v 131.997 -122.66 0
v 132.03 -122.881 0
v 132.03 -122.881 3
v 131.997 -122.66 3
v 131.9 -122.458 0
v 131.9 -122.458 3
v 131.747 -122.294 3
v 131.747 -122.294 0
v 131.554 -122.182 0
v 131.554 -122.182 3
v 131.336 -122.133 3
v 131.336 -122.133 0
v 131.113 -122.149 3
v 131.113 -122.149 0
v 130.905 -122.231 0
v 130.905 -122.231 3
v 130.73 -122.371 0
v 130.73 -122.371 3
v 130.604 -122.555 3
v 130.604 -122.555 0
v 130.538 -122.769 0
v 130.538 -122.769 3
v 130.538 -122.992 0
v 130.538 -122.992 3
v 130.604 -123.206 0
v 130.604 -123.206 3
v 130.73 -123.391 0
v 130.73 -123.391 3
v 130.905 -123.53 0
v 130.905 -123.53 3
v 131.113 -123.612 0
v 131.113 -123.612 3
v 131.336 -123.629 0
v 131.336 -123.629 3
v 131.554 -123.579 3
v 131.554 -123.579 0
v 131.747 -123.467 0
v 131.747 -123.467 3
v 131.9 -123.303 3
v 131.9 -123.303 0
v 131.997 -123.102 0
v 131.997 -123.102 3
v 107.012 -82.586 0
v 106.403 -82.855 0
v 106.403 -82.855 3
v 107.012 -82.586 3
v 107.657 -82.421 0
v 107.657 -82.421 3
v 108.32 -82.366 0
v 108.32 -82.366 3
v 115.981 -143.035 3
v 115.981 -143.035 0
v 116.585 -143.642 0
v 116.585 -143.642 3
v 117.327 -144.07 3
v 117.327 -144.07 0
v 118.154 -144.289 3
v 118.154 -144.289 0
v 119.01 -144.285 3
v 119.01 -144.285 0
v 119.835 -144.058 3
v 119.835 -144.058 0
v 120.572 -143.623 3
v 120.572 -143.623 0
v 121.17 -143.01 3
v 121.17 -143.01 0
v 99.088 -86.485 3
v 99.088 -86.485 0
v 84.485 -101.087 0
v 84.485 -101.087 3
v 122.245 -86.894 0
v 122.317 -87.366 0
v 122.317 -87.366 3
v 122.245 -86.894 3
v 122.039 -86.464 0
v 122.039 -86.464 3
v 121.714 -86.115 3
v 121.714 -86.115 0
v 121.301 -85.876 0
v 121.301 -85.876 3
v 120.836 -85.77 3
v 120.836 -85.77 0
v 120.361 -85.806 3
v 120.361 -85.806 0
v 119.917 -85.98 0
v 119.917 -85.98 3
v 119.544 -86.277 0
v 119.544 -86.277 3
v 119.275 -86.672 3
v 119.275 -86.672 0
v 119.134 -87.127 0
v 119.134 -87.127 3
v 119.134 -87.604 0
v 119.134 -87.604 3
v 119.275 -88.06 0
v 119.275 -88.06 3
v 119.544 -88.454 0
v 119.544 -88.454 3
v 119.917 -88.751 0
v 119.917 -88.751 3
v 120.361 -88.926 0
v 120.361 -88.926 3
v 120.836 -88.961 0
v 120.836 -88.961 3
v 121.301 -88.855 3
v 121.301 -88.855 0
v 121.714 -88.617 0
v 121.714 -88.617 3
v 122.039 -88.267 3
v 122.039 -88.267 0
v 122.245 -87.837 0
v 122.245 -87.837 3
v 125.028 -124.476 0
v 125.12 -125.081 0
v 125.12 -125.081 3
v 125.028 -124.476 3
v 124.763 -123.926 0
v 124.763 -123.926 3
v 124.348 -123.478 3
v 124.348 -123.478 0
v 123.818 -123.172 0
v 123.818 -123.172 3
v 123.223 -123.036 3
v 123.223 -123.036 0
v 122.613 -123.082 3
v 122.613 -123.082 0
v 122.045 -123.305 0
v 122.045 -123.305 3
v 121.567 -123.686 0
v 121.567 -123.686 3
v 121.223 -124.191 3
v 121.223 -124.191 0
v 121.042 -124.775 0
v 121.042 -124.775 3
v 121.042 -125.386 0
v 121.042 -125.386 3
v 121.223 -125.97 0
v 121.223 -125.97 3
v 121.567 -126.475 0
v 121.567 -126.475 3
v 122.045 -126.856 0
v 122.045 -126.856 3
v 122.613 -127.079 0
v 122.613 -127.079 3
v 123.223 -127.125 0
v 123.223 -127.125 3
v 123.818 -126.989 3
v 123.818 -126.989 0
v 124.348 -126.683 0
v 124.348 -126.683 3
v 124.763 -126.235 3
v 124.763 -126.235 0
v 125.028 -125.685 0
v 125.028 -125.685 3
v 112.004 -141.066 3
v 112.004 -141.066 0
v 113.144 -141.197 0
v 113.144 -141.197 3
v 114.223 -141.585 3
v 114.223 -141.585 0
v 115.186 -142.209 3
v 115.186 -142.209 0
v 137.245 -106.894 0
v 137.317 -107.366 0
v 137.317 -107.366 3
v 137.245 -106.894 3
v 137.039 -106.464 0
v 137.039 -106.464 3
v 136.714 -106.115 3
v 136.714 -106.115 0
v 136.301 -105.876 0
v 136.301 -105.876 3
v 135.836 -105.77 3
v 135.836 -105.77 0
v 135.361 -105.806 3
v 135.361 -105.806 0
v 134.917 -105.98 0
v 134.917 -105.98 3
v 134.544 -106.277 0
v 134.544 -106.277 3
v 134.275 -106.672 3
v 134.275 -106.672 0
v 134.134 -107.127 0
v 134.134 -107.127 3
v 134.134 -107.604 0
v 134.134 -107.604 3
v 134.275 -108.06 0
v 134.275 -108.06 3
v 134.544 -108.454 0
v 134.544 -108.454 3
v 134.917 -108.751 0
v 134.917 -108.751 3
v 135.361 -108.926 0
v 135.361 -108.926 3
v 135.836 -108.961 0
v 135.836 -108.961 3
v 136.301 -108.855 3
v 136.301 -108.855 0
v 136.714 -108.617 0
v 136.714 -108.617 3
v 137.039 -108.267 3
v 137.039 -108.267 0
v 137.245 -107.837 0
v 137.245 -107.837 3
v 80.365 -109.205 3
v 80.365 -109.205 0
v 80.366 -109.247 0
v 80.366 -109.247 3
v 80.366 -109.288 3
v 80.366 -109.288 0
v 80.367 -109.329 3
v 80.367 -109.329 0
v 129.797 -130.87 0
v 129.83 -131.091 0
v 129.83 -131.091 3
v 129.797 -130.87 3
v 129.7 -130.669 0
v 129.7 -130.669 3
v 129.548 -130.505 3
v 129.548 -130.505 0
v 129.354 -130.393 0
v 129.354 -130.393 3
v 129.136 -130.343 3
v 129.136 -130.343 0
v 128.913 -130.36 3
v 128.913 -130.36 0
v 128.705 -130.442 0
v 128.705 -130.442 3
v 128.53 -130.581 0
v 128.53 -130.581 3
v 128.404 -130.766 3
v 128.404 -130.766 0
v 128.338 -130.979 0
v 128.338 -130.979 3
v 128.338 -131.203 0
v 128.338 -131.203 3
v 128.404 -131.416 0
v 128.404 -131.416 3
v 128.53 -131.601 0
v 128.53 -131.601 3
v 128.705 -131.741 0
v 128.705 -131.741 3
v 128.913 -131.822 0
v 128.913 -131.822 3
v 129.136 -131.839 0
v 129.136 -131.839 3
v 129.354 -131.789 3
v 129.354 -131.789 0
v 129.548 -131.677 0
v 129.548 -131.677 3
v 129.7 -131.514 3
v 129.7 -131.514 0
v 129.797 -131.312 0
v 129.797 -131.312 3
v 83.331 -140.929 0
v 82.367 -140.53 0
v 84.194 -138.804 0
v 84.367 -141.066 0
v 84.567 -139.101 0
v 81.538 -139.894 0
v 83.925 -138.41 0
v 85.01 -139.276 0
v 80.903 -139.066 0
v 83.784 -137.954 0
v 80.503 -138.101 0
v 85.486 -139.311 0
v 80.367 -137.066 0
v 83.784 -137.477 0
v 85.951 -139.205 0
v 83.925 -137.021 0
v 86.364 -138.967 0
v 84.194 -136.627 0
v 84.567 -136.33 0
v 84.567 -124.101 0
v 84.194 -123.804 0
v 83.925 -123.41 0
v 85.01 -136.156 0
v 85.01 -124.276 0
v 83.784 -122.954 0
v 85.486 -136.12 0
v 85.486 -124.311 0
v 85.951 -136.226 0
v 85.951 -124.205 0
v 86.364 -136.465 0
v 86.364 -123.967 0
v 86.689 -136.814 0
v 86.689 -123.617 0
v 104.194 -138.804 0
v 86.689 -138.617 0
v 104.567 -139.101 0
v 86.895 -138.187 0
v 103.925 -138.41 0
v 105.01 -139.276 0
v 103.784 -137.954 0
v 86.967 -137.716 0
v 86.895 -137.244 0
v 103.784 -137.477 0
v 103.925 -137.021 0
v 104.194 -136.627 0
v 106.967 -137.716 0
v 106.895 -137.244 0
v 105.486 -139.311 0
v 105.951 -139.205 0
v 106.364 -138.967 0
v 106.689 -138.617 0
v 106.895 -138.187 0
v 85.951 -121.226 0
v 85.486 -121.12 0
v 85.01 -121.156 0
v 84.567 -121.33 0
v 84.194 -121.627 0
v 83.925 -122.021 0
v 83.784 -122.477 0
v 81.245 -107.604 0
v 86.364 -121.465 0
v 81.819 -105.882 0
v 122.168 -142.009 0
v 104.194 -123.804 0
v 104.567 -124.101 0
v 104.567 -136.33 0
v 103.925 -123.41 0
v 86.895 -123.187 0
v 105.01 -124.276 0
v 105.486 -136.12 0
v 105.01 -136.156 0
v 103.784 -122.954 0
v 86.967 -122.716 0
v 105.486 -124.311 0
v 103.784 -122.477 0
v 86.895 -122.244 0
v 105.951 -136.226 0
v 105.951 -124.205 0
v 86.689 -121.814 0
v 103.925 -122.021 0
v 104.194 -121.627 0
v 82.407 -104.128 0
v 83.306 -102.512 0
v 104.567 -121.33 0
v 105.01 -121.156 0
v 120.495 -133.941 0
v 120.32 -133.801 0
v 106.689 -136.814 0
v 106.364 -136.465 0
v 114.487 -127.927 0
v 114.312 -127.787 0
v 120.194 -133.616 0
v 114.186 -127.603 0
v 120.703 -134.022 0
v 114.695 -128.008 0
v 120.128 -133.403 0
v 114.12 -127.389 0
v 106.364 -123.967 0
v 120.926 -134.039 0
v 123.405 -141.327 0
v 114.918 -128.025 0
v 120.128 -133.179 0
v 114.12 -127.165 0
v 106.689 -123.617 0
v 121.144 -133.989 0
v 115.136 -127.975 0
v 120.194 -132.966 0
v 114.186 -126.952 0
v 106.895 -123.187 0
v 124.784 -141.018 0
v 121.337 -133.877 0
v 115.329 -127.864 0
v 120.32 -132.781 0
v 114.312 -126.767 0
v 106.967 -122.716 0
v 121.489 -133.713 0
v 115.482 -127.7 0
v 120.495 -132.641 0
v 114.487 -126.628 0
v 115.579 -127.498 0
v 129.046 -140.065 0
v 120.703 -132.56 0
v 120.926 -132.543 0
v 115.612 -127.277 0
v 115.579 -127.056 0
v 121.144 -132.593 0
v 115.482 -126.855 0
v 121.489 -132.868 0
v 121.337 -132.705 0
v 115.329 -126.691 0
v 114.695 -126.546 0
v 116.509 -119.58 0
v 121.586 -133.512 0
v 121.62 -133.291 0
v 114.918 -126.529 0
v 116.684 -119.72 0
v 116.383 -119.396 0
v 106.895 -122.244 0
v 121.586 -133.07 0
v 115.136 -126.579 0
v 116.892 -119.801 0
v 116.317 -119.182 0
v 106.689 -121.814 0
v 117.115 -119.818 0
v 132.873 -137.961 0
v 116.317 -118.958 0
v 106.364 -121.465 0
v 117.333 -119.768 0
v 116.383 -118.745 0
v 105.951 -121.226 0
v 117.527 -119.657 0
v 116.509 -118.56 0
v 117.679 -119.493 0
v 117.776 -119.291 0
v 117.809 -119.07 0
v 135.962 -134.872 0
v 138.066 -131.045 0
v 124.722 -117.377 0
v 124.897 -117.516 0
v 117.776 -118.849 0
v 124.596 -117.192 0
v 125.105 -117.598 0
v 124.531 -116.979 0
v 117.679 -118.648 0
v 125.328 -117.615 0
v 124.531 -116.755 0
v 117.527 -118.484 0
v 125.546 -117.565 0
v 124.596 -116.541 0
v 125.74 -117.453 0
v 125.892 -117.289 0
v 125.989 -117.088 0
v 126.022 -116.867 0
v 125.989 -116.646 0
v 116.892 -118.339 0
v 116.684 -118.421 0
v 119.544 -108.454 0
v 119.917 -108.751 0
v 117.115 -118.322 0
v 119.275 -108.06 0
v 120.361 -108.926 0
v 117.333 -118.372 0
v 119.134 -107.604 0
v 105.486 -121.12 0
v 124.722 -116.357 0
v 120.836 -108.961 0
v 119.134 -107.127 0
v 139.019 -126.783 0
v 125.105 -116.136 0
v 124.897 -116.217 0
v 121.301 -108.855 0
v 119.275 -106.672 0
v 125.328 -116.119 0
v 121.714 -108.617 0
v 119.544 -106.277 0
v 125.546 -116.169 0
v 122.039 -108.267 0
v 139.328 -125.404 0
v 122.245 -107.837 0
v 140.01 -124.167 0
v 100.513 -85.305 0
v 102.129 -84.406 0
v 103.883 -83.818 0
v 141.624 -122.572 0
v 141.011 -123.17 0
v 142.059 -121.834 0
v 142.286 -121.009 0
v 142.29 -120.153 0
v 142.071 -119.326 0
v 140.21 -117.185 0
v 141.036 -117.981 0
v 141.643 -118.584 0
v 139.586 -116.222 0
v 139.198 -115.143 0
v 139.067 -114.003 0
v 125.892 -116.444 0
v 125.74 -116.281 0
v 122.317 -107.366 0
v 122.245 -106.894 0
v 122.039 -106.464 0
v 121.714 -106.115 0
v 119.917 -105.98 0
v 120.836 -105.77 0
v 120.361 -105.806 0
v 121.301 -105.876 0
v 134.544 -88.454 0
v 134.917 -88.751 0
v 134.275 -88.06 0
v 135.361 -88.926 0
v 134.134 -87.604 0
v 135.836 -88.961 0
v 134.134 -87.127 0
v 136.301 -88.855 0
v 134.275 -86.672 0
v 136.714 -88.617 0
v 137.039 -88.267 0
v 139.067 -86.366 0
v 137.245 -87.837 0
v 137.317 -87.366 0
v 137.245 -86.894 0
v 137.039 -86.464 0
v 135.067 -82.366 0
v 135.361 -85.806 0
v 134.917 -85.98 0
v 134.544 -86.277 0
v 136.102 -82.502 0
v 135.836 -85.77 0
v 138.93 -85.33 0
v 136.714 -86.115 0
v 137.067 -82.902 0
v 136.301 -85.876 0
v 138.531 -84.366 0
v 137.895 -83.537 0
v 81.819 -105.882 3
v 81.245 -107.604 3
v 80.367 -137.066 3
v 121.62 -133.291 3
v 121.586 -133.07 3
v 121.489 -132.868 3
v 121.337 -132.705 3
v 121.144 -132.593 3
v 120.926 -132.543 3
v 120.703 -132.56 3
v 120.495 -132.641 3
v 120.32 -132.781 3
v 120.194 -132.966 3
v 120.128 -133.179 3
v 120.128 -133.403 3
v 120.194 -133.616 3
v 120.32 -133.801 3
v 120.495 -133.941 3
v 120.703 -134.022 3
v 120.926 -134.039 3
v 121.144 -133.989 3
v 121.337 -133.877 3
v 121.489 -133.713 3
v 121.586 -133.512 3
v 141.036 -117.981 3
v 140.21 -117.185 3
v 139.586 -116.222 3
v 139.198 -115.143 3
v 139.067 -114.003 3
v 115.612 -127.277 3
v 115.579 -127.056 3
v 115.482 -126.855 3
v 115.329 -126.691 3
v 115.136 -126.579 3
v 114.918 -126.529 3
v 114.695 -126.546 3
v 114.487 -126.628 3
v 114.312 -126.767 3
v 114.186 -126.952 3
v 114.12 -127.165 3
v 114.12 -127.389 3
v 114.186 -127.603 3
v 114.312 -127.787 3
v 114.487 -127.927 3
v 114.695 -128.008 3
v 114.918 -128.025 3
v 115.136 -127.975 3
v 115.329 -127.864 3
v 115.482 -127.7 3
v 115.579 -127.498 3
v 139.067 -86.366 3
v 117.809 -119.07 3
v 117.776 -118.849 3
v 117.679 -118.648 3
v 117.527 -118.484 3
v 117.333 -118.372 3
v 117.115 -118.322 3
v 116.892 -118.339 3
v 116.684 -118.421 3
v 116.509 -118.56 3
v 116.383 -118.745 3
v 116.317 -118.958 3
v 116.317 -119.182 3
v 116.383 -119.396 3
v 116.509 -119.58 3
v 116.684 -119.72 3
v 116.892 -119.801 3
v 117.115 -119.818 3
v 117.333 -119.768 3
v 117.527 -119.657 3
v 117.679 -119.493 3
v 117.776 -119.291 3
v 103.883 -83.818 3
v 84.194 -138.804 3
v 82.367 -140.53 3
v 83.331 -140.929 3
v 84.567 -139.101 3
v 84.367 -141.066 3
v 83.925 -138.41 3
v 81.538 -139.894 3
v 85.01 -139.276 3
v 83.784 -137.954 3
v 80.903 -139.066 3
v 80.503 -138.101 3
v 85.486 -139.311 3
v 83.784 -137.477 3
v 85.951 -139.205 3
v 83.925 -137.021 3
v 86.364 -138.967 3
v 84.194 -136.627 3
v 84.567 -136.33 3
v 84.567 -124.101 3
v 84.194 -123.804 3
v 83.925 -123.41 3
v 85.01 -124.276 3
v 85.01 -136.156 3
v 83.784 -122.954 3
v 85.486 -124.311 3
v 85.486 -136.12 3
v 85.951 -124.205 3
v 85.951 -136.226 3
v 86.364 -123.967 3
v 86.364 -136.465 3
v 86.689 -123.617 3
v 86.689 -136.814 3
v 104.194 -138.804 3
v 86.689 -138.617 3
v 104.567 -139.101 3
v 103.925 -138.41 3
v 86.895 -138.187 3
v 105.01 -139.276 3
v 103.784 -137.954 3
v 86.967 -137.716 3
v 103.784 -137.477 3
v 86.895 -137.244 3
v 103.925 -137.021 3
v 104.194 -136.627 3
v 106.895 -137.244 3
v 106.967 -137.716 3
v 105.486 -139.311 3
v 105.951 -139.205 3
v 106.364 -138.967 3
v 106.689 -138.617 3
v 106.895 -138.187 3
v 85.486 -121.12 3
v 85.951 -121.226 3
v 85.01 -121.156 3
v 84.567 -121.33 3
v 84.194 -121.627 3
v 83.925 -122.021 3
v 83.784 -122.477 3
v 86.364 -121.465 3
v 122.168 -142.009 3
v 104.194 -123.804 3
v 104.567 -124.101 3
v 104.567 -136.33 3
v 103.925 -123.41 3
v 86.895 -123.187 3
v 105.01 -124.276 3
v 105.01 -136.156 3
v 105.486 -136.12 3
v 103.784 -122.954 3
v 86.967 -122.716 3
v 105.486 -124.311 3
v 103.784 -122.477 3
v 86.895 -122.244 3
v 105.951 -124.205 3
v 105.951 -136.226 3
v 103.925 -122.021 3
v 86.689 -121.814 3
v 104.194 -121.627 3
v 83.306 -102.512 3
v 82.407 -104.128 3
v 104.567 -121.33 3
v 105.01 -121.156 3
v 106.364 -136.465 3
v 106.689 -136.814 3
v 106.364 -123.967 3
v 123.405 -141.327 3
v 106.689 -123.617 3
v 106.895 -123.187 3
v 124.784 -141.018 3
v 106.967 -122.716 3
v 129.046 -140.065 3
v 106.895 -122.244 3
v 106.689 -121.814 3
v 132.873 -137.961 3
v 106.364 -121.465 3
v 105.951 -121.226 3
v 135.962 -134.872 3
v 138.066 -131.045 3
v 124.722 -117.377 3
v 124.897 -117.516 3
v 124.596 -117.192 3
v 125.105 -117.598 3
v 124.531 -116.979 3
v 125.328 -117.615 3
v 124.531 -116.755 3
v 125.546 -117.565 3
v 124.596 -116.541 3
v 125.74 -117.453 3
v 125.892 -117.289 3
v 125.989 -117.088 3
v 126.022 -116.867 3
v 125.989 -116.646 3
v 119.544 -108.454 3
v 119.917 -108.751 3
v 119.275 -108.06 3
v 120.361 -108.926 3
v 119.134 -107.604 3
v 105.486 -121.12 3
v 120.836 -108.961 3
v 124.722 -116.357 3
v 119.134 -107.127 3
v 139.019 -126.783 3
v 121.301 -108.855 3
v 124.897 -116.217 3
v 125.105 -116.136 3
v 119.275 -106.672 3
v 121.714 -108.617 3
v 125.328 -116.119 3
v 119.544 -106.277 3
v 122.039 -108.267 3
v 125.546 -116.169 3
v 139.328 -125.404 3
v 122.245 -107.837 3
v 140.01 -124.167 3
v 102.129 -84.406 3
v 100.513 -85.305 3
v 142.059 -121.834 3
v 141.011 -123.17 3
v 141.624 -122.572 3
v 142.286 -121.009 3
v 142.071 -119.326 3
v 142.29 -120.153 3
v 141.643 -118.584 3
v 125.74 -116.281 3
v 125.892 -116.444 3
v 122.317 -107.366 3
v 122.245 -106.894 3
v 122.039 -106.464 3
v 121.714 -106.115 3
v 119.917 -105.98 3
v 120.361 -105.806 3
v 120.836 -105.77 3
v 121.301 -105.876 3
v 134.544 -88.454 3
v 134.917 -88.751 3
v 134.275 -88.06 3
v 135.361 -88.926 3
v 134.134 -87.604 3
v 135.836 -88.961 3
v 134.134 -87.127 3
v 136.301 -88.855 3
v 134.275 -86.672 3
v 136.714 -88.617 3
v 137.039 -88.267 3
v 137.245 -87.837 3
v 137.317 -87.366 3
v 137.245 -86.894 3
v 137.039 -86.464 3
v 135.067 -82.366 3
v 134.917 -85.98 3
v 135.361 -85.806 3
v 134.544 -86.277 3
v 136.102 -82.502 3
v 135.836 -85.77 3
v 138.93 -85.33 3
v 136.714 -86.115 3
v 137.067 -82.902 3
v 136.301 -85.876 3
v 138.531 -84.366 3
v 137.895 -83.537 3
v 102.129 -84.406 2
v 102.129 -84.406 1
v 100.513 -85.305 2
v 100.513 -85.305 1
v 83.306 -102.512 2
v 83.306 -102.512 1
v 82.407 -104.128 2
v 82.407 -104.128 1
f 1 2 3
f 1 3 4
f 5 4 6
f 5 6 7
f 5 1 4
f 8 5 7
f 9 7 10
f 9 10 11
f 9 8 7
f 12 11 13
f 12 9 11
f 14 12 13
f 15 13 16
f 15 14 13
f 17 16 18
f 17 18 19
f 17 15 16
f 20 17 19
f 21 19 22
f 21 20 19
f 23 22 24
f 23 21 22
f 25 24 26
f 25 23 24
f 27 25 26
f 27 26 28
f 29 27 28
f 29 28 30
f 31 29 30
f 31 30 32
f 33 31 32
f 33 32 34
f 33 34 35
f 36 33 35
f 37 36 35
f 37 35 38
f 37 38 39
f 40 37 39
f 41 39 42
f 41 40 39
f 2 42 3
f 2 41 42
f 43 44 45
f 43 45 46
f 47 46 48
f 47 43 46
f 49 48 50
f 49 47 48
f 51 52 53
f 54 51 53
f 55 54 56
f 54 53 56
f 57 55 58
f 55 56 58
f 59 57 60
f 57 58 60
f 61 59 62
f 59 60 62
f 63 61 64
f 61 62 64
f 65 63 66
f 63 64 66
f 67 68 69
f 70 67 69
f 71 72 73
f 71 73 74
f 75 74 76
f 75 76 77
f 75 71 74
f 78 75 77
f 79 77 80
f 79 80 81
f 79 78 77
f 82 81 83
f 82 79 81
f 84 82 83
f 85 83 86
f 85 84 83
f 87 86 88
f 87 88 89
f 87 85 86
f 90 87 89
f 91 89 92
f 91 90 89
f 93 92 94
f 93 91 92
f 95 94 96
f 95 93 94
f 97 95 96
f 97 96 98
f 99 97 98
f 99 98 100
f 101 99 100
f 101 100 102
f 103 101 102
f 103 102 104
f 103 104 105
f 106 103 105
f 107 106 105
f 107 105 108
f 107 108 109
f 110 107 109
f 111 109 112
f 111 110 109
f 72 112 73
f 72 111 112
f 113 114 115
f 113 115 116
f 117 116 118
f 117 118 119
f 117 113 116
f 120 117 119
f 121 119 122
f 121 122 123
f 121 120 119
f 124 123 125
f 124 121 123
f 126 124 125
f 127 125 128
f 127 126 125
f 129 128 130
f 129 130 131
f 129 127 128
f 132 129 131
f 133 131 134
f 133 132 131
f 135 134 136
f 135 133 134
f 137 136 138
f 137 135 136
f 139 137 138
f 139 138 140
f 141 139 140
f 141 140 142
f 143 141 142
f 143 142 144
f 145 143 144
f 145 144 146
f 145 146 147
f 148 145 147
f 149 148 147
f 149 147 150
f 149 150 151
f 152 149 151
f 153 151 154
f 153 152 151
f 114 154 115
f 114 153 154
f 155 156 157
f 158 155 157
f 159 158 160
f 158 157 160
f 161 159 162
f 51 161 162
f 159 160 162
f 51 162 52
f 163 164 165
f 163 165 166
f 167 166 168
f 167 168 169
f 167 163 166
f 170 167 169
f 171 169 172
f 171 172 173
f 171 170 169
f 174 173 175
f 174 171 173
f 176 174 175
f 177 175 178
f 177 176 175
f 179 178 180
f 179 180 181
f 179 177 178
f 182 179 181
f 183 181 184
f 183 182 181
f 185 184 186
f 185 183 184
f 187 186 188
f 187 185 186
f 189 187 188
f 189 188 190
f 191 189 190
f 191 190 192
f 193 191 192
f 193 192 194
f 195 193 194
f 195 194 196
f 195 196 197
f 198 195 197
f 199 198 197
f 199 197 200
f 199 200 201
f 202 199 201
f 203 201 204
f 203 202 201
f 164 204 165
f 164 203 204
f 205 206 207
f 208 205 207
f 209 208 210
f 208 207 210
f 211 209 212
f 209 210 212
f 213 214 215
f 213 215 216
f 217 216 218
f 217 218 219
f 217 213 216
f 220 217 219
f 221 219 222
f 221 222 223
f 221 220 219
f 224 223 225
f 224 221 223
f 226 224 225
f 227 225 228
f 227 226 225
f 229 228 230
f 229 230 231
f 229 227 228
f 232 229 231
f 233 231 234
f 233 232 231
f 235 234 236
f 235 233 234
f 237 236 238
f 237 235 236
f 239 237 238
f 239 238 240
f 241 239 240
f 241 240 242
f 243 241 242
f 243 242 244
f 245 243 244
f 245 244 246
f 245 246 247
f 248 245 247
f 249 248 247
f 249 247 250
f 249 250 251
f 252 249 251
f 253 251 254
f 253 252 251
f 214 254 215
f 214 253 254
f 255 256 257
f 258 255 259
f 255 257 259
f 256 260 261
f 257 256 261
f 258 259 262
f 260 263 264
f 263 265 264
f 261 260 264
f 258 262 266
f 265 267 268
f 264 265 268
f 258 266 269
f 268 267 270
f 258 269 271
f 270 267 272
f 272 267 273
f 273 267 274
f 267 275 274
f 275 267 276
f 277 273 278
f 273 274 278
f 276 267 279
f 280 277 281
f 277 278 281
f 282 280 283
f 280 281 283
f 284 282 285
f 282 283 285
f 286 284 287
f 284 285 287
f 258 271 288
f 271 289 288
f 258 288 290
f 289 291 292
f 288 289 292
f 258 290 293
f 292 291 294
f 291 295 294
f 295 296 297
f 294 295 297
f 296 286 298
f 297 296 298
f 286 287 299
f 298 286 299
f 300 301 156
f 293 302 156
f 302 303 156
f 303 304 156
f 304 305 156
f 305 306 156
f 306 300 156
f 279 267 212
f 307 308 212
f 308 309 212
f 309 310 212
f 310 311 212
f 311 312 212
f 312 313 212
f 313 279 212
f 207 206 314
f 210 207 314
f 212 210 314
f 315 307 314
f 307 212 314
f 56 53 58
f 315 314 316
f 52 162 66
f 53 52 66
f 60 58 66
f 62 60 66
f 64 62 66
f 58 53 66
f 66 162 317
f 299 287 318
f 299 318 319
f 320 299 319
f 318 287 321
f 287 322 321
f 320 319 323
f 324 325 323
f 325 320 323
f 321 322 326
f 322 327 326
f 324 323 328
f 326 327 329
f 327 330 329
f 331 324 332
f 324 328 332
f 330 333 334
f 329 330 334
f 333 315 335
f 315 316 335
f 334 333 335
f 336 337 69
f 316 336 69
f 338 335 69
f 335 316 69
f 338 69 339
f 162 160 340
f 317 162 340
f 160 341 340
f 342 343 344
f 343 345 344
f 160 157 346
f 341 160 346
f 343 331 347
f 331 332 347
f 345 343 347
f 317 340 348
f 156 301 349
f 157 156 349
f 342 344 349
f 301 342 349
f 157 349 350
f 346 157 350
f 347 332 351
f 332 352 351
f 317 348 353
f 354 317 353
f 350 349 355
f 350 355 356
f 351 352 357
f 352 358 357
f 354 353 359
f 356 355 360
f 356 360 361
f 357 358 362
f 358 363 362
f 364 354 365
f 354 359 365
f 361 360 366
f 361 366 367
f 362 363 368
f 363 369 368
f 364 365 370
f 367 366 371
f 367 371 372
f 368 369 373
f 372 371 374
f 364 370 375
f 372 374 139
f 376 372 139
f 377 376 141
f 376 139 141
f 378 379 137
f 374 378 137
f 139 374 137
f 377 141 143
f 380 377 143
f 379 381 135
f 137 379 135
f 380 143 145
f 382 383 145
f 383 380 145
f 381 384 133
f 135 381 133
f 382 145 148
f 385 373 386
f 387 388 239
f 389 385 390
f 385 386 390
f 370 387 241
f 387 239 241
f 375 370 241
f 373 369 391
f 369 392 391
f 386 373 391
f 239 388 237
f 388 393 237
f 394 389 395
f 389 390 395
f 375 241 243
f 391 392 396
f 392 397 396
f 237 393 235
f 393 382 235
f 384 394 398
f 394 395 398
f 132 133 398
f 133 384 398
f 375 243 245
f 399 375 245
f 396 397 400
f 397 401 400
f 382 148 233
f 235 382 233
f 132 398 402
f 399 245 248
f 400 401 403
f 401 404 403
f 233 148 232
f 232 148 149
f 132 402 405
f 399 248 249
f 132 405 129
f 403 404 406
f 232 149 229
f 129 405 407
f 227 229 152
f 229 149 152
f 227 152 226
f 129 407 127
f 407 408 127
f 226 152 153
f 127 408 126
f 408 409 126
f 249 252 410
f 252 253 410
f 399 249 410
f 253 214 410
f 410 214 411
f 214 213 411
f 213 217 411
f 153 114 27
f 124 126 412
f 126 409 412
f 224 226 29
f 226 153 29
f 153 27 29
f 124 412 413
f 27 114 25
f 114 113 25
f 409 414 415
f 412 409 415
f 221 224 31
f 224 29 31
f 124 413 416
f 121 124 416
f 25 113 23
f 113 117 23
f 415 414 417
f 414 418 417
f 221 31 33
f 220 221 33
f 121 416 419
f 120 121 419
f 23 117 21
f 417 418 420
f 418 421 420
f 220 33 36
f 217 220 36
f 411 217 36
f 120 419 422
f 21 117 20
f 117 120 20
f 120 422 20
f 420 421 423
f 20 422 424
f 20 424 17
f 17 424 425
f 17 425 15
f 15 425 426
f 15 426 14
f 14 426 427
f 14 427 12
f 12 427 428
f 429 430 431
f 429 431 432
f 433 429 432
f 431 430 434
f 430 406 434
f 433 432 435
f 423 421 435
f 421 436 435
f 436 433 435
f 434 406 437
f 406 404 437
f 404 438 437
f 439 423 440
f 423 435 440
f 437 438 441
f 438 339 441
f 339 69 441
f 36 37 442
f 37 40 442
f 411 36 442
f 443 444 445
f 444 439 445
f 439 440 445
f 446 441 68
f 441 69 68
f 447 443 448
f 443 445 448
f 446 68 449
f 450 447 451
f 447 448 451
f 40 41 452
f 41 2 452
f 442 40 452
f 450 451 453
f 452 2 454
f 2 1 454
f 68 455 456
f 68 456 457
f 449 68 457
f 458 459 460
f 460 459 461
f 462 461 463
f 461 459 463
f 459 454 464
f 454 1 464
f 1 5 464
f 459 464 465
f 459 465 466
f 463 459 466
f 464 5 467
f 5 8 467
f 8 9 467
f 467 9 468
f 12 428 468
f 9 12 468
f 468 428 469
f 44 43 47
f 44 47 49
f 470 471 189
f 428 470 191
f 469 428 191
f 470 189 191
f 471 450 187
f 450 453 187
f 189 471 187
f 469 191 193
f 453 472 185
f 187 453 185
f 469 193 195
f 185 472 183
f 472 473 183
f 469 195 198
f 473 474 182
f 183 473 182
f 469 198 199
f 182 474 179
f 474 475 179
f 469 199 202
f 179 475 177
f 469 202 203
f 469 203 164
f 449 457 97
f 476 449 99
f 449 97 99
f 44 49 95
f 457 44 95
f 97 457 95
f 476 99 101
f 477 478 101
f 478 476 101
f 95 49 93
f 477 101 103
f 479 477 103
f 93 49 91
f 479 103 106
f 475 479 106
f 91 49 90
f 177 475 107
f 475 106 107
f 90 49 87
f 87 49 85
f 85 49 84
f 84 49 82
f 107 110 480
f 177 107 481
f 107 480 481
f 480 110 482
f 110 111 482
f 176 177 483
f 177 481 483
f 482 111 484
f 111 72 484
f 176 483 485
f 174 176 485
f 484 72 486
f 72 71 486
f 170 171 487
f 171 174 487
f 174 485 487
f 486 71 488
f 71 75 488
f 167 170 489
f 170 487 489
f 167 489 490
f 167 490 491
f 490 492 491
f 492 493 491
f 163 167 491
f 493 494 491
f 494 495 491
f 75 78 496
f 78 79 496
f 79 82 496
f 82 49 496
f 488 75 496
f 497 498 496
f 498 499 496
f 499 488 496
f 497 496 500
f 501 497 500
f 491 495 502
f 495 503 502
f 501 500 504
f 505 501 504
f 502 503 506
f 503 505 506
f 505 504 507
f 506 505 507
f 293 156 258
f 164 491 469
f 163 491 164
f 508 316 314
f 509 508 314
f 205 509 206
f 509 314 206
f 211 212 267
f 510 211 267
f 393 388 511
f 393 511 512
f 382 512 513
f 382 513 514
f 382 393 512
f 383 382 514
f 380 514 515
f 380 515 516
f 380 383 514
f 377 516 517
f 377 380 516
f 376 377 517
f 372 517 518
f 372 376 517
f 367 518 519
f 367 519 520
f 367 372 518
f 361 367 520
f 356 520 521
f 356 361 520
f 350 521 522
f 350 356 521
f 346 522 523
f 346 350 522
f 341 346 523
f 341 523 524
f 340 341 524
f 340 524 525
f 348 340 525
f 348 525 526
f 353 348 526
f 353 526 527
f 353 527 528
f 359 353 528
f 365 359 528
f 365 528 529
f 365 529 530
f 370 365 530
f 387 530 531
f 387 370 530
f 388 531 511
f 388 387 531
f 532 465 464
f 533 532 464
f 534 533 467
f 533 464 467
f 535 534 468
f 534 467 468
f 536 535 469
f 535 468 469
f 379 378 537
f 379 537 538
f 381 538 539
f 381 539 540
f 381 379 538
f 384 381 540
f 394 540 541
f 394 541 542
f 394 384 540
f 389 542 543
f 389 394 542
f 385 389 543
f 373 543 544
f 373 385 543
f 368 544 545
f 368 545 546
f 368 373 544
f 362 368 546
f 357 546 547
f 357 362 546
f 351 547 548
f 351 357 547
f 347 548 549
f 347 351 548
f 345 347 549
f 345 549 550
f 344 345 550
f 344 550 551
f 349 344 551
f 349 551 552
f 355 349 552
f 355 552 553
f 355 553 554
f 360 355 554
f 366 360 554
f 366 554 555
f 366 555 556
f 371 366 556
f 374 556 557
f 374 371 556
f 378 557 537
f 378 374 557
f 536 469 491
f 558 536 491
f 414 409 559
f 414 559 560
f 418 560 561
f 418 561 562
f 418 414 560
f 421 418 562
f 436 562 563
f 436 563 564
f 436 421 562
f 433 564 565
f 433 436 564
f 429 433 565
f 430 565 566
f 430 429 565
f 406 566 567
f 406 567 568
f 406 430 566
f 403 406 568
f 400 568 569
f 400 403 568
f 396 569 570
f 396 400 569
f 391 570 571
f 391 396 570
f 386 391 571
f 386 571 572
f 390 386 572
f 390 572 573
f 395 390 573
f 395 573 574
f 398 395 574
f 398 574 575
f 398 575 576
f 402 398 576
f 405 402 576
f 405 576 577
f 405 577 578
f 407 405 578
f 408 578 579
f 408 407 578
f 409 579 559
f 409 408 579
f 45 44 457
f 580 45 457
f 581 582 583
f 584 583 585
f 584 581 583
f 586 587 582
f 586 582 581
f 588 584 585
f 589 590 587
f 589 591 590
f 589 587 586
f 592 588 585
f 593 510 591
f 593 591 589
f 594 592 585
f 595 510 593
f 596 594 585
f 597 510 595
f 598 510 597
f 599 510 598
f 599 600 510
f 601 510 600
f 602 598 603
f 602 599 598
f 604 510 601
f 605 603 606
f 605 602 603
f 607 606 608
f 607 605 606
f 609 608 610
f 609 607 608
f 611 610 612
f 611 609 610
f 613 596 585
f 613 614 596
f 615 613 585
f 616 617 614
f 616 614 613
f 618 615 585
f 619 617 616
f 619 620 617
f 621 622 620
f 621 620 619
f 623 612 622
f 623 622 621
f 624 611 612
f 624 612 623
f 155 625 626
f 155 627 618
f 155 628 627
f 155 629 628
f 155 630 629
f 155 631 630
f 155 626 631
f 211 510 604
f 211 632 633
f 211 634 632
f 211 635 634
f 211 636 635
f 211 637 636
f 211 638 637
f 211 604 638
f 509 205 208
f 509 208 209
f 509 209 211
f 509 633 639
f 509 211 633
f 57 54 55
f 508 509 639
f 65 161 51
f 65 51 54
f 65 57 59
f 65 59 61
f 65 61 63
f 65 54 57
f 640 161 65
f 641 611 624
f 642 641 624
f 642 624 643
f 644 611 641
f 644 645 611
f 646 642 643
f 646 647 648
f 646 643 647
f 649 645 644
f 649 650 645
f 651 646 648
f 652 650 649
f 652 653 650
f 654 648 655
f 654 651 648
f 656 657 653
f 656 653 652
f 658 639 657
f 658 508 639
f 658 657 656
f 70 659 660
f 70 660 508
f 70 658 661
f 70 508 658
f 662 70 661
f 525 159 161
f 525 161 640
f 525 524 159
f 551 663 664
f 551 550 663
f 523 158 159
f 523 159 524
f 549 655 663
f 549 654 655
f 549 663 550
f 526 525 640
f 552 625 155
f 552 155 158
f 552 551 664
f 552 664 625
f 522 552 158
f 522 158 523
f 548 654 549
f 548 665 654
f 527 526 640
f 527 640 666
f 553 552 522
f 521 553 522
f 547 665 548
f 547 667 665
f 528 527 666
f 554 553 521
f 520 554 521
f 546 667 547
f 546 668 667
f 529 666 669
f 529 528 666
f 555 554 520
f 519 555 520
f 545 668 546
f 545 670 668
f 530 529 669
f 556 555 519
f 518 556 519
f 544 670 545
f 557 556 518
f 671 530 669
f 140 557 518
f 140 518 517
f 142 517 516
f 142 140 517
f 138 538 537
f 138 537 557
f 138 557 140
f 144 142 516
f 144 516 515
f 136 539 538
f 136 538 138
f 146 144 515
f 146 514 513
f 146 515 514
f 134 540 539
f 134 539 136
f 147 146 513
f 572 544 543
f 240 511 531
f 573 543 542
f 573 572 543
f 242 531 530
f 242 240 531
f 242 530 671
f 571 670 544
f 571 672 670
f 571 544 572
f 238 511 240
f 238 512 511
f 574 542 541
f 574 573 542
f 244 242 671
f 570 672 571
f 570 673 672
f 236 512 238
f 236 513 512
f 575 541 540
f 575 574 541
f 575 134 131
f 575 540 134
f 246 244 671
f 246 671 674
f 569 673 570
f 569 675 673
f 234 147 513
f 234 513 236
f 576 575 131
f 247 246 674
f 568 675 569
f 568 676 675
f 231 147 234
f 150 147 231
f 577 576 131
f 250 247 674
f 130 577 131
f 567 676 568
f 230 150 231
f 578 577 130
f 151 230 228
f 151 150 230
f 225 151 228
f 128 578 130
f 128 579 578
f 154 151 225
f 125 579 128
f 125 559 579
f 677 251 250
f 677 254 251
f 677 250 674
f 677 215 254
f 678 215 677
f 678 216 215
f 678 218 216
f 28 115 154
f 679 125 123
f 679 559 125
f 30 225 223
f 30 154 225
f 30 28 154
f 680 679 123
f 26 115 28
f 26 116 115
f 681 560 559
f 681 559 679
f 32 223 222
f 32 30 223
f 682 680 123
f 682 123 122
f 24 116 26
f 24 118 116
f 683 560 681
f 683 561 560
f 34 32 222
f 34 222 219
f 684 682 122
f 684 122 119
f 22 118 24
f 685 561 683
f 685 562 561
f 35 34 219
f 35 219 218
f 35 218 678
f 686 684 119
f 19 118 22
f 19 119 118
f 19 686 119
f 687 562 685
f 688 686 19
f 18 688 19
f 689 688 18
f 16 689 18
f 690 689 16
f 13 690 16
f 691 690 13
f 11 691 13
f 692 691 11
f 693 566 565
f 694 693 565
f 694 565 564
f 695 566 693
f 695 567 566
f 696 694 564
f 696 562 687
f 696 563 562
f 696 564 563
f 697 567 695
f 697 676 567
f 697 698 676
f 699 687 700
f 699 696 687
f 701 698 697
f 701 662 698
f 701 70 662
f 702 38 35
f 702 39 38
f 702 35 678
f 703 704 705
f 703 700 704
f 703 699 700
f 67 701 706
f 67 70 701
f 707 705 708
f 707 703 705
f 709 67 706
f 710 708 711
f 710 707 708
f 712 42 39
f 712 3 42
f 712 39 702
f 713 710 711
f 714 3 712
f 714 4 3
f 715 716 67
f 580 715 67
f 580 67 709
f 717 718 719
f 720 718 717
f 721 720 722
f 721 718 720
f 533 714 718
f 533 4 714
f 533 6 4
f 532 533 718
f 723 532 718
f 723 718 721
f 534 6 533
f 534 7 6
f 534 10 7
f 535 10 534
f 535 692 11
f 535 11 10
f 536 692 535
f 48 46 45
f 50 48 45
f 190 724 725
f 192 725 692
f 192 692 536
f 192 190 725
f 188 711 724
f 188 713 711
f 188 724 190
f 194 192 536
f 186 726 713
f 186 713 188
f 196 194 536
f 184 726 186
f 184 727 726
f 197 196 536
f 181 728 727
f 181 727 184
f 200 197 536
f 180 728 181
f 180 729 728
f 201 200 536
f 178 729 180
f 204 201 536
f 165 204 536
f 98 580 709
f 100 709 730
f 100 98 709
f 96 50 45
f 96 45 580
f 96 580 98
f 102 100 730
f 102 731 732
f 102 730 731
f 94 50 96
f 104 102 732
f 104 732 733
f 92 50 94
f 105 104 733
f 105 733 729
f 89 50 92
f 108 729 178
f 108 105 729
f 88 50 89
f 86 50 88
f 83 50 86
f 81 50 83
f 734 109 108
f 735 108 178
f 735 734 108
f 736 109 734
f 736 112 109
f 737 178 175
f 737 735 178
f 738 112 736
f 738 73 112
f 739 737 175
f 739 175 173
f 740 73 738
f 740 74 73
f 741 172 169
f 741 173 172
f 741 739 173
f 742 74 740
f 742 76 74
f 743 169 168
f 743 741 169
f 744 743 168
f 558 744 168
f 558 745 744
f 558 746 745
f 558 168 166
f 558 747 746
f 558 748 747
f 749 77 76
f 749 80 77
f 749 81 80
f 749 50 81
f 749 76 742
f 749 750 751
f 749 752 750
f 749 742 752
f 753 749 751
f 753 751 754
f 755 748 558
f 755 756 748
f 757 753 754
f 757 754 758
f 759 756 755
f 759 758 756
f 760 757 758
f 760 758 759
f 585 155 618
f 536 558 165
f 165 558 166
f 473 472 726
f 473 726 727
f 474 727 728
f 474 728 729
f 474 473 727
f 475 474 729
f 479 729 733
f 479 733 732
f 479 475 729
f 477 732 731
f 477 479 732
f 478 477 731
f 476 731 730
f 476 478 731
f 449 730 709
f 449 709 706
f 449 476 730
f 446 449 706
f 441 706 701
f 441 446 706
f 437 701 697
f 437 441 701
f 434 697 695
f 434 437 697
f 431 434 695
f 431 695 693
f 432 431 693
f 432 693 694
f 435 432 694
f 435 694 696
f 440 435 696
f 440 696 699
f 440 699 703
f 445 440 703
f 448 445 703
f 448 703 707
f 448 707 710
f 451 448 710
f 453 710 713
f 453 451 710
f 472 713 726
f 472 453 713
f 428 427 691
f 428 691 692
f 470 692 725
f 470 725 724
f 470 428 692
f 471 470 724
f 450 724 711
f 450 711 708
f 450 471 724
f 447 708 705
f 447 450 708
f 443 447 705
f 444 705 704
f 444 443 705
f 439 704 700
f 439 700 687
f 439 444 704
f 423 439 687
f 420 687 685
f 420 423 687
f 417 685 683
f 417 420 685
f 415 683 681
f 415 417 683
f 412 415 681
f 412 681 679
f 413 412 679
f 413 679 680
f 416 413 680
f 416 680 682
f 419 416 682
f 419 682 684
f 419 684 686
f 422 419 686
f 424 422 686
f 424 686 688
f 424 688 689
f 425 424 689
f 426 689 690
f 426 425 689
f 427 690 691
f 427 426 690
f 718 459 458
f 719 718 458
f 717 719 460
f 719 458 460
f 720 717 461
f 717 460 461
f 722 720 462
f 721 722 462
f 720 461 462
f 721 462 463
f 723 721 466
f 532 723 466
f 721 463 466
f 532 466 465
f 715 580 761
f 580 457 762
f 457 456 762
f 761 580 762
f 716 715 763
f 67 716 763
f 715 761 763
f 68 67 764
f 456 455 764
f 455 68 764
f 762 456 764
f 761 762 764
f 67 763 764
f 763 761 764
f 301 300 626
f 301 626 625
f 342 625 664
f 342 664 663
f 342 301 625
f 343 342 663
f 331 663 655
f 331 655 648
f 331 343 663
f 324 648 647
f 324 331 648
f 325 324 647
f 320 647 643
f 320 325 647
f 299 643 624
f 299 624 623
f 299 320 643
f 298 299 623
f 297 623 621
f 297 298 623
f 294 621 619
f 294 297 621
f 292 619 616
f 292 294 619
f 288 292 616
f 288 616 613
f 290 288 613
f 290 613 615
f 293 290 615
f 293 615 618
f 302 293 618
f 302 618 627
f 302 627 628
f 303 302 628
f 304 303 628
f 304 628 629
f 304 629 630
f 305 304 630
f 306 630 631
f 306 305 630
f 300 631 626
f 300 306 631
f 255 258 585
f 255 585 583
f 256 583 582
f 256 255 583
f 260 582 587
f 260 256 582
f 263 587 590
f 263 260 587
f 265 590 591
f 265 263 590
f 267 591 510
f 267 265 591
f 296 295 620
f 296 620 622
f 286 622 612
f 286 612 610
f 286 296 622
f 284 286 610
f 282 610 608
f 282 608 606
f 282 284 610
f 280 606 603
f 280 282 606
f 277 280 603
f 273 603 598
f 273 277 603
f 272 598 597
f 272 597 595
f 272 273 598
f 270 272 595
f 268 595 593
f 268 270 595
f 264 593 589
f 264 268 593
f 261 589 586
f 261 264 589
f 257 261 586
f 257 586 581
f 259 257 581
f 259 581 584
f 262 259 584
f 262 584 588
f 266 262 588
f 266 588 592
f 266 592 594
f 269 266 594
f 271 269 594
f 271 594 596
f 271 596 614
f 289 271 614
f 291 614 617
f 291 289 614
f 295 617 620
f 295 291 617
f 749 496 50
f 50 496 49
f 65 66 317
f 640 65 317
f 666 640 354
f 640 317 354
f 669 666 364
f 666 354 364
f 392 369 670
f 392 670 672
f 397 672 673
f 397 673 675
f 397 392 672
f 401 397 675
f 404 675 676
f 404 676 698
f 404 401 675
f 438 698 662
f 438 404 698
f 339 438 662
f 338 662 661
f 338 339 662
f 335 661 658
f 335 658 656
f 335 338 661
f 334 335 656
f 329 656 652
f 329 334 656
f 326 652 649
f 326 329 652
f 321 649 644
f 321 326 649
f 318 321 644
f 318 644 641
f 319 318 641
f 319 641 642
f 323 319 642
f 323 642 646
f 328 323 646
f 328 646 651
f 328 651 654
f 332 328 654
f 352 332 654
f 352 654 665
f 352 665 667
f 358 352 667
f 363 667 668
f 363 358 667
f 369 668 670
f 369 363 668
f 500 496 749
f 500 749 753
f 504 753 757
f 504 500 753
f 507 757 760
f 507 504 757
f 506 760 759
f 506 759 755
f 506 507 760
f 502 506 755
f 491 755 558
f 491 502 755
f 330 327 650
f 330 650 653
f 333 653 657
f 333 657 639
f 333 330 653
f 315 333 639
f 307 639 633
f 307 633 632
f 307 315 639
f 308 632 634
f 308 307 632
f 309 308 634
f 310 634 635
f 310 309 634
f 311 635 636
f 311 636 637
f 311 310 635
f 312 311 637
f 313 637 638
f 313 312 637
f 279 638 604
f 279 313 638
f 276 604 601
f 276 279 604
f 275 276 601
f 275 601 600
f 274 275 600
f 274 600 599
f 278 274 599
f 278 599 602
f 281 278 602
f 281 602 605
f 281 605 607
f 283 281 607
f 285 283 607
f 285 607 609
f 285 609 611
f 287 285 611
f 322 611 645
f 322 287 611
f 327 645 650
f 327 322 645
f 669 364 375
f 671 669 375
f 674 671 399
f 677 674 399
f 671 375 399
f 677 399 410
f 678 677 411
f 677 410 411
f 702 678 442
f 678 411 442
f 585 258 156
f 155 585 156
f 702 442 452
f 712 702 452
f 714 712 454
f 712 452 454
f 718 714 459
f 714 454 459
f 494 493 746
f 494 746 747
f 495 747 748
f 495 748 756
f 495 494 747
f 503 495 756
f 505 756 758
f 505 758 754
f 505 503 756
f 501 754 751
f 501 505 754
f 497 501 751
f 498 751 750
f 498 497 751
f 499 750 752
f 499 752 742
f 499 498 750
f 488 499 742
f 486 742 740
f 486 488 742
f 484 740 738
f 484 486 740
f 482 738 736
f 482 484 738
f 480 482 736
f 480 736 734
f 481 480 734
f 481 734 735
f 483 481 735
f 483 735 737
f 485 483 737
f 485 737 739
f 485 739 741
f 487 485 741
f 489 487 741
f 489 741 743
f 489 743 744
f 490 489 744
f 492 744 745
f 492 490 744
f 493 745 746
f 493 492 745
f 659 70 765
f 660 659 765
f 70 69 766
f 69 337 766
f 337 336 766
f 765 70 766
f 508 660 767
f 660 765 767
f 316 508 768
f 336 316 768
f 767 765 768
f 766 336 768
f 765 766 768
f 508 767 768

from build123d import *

# Parameters (mm, degrees)
SKETCH1_R           = 0.75
SKETCH1_R_2         = 2.05
SKETCH1_R_3         = 1.6
BOSS_EXTRUDE1_DEPTH = 3
CUT_EXTRUDE2_DEPTH  = 3
FILLET1_START       = -1
FILLET1_DEPTH       = 5
FILLET1_2_DEPTH     = 3


with BuildPart() as part:
    # Sketch1 → Boss-Extrude1 (new body)
    with BuildSketch(Plane.XY):
        with BuildLine():
            Line((76.776362435, -141.065631197), (112.004342533, -141.065631197))
            ThreePointArc((112.004342533, -141.065631197), (114.223405945, -141.585033293), (115.981434881, -143.035328167))
            ThreePointArc((115.981434881, -143.035328167), (118.582167111, -144.31559365), (121.170471257, -143.010385054))
            ThreePointArc((121.170471257, -143.010385054), (122.762010679, -141.623937155), (124.783836945, -141.017757268))
            ThreePointArc((124.783836945, -141.017757268), (134.526700016, -136.525786306), (139.018670978, -126.782923235))
            ThreePointArc((139.018670978, -126.782923235), (139.624850866, -124.761096969), (141.011298764, -123.169557547))
            ThreePointArc((141.011298764, -123.169557547), (142.31650736, -120.5812534), (141.036241877, -117.980521171))
            ThreePointArc((141.036241877, -117.980521171), (139.585947004, -116.222492234), (139.066544907, -114.003428823))
            Line((139.066544907, -114.003428823), (139.066544907, -78.7754981))
            ThreePointArc((139.066544907, -78.7754981), (141.336583349, -75.865660283), (139.066544907, -72.955822465))
            ThreePointArc((139.066544907, -72.955822465), (136.675727861, -69.984491924), (133.029767481, -68.865660283))
            Line((133.029767481, -68.865660283), (117.643399217, -68.865660283))
            ThreePointArc((117.643399217, -68.865660283), (113.997438837, -69.984491924), (111.60662179, -72.955822465))
            ThreePointArc((111.60662179, -72.955822465), (109.382649666, -75.341946816), (110.650765895, -78.347196))
            add(Edge.make_bspline(
                [(110.650765895, -78.347196), (109.91906925, -79.898232812), (107.925256124, -82.271997183), (105.135443821, -83.525315829), (103.882990325, -83.818107321)],
                knots=[-0.902991905, -0.902991905, -0.902991905, -0.902991905, -0.38699657, 0, 0, 0, 0], degree=3, weights=[1, 1, 1, 1, 1]))
            add(Edge.make_bspline(
                [(103.882990325, -83.818107321), (102.079131121, -84.239803321), (100.398199973, -85.1745908), (99.088288993, -86.484502541)],
                knots=[0, 0, 0, 0, 0.557222971, 0.557222971, 0.557222971, 0.557222971], degree=3, weights=[1, 1, 1, 1]))
            Line((99.088288993, -86.484502541), (84.485352307, -101.08744771))
            add(Edge.make_bspline(
                [(84.485352307, -101.08744771), (83.175441742, -102.397359036), (82.240655409, -104.078290075), (81.818960273, -105.882148879)],
                knots=[0.344558041, 0.344558041, 0.344558041, 0.344558041, 0.901042549, 0.901042549, 0.901042549, 0.901042549], degree=3, weights=[1, 1, 1, 1]))
            add(Edge.make_bspline(
                [(81.818960273, -105.882148879), (81.428573164, -107.552083308), (79.976526739, -110.290981661), (77.511343468, -112.101144248), (76.34806998, -112.649918673)],
                knots=[0.442078245, 0.442078245, 0.442078245, 0.442078245, 0.957761165, 1.344523278, 1.344523278, 1.344523278, 1.344523278], degree=3, weights=[1, 1, 1, 1, 1]))
            ThreePointArc((76.34806998, -112.649918673), (73.342799133, -111.381774562), (70.956667683, -113.605784292))
            ThreePointArc((70.956667683, -113.605784292), (67.985343813, -115.996601782), (66.866515059, -119.642557902))
            Line((66.866515059, -119.642557902), (66.866515059, -135.028857587))
            ThreePointArc((66.866515059, -135.028857587), (67.985343813, -138.674813706), (70.956667683, -141.065631197))
            ThreePointArc((70.956667683, -141.065631197), (73.866515059, -143.335707744), (76.776362435, -141.065631197))
        make_face()
        with Locations((129.079908052, -131.091021895)):
            Circle(SKETCH1_R, mode=Mode.SUBTRACT)
        with Locations((120.86953867, -133.290983741)):
            Circle(SKETCH1_R, mode=Mode.SUBTRACT)
        with Locations((114.861843981, -127.277234232)):
            Circle(SKETCH1_R, mode=Mode.SUBTRACT)
        with Locations((117.059092978, -119.070206821)):
            Circle(SKETCH1_R, mode=Mode.SUBTRACT)
        with Locations((125.27217521, -116.866903003)):
            Circle(SKETCH1_R, mode=Mode.SUBTRACT)
        with Locations((123.069502622, -125.080616499)):
            Circle(SKETCH1_R_2, mode=Mode.SUBTRACT)
        with Locations((131.279869898, -122.880652512)):
            Circle(SKETCH1_R, mode=Mode.SUBTRACT)
        with Locations((85.366524977, -122.715631197)):
            Circle(SKETCH1_R_3, mode=Mode.SUBTRACT)
        with Locations((85.366524977, -137.715631197)):
            Circle(SKETCH1_R_3, mode=Mode.SUBTRACT)
        with Locations((105.366524977, -137.715631197)):
            Circle(SKETCH1_R_3, mode=Mode.SUBTRACT)
        with Locations((105.366524977, -122.715631197)):
            Circle(SKETCH1_R_3, mode=Mode.SUBTRACT)
        with Locations((135.716544907, -87.365719383)):
            Circle(SKETCH1_R_3, mode=Mode.SUBTRACT)
        with Locations((120.716544907, -87.365719383)):
            Circle(SKETCH1_R_3, mode=Mode.SUBTRACT)
        with Locations((120.716544907, -107.365719383)):
            Circle(SKETCH1_R_3, mode=Mode.SUBTRACT)
        with Locations((135.716544907, -107.365719383)):
            Circle(SKETCH1_R_3, mode=Mode.SUBTRACT)
    extrude(amount=BOSS_EXTRUDE1_DEPTH)

    # Sketch2 → Cut-Extrude2 (cut)
    with BuildSketch(Plane(origin=(0, 0, 0), x_dir=(-1, 0, 0), z_dir=(0, 0, -1))):
        Polygon((-139.066544907, -82.365719383), (-107.206390326, -82.365719383), (-105.489345494, -66.543961021), (-134.526700016, -61.302844114), (-151.077173689, -66.543961021), align=None)
        Polygon((-64.544828407, -107.48854343), (-80.366589508, -109.20556302), (-80.366640336, -141.065717602), (-64.544901135, -153.076371625), (-59.303757824, -136.525906313), align=None)
    extrude(amount=-CUT_EXTRUDE2_DEPTH, mode=Mode.SUBTRACT)

    # Fillet1: read off the stored shape, not the designer's step
    # Fillet1 outline → Fillet1 (cut)
    with BuildSketch(Plane.XY.offset(FILLET1_START)):
        with BuildLine():
            Line((80.366640336, -141.065631197), (84.366633955, -141.065631197))
            ThreePointArc((84.366633955, -141.065631197), (81.538209086, -139.894060578), (80.366633955, -137.065637579))
            Line((80.366633955, -137.065637579), (80.366640336, -141.065631197))
        make_face()
        with BuildLine():
            add(Edge.make_bspline(
                [(107.206390326, -82.365719383), (106.946532094, -82.541418076), (106.678265015, -82.704743583), (106.402886758, -82.855136258)],
                knots=[-0.365754194, -0.365754194, -0.365754194, -0.365754194, -0.271346383, -0.271346383, -0.271346383, -0.271346383], degree=3))
            ThreePointArc((106.402886758, -82.855136258), (107.330765678, -82.490004449), (108.320125951, -82.365719383))
            Line((108.320125951, -82.365719383), (107.206390326, -82.365719383))
        make_face()
        with BuildLine():
            Line((139.066544907, -82.365719383), (135.066544907, -82.365719383))
            ThreePointArc((135.066544907, -82.365719383), (137.894972032, -83.537292258), (139.066544907, -86.365719383))
            Line((139.066544907, -86.365719383), (139.066544907, -82.365719383))
        make_face()
    extrude(amount=FILLET1_DEPTH, mode=Mode.SUBTRACT)

    # Fillet1 2 outline → Fillet1 2 (add)
    with BuildSketch(Plane.XY):
        with BuildLine():
            ThreePointArc((80.364665709, -109.205354245), (80.366108628, -109.267368328), (80.366589705, -109.329397329))
            Line((80.366589705, -109.329397329), (80.366589508, -109.20556302))
            Line((80.366589508, -109.20556302), (80.364665709, -109.205354245))
        make_face()
    extrude(amount=FILLET1_2_DEPTH)


solid = part.part
